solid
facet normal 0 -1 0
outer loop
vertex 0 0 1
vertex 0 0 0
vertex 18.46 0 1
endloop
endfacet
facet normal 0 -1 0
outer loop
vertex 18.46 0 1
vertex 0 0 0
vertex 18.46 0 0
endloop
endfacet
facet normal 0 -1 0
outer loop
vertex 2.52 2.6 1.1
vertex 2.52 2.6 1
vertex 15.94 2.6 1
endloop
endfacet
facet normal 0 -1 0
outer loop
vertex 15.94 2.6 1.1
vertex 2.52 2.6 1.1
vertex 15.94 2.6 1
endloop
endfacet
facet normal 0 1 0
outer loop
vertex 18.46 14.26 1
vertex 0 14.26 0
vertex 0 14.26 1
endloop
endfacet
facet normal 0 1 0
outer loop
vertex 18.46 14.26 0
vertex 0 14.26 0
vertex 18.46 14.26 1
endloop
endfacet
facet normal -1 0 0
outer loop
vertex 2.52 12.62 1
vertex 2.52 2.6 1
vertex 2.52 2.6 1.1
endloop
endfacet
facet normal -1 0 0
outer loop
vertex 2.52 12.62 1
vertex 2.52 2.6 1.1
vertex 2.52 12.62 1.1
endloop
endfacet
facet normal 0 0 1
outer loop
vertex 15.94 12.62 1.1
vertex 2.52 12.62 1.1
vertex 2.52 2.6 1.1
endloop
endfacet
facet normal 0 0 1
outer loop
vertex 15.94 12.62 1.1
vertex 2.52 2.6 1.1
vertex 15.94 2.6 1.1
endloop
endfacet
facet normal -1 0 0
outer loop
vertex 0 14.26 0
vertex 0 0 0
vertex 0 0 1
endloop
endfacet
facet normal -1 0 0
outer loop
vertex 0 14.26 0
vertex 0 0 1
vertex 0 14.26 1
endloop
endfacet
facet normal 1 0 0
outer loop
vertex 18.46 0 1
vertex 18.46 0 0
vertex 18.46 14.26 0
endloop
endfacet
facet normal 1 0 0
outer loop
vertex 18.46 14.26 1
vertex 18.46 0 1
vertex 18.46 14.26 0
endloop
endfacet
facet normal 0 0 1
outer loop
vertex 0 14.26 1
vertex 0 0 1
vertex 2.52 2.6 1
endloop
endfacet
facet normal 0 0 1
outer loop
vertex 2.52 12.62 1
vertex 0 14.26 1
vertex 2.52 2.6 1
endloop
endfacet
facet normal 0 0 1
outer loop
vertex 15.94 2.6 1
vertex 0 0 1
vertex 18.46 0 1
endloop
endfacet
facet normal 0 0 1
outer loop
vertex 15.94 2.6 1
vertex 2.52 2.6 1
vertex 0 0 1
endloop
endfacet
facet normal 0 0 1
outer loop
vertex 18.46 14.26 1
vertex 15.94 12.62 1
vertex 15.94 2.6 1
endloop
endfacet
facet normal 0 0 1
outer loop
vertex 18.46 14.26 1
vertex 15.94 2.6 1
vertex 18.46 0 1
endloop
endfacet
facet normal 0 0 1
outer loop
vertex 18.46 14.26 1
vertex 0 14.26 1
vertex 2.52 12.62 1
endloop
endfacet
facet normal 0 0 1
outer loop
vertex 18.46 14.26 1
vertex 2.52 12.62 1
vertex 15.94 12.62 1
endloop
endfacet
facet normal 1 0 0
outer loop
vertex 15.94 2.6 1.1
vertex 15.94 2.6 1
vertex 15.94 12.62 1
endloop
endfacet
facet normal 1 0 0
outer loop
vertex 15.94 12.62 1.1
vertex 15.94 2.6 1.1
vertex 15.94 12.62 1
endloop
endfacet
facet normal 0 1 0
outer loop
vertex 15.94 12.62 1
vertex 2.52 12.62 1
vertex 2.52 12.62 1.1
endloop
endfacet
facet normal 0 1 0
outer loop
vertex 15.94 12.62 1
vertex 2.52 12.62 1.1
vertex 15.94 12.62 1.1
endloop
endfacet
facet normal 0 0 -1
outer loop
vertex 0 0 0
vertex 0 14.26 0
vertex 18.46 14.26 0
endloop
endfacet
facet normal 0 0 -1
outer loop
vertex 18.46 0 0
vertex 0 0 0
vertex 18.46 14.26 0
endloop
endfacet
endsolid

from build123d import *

# Parameters (mm, degrees)
BOX001_W     = 18.46
BOX001_H     = 14.26
BOX001_DEPTH = 1
BOX_W        = 13.42
BOX_H        = 10.02
BOX_DEPTH    = 0.1


with BuildPart() as dispcarrier:
    # Box001 → Box001 (new body)
    with BuildSketch(Plane.XY):
        with Locations((9.23, 7.13)):
            Rectangle(BOX001_W, BOX001_H)
    extrude(amount=BOX001_DEPTH)


with BuildPart() as display:
    # Box → Box (new body)
    with BuildSketch(Plane(origin=(2.52, 2.6, 1), x_dir=(1, 0, 0), z_dir=(0, 0, 1))):
        with Locations((6.71, 5.01)):
            Rectangle(BOX_W, BOX_H)
    extrude(amount=BOX_DEPTH)

    # Fusion: union Dispcarrier
    add(dispcarrier.part)


solid = display.part
